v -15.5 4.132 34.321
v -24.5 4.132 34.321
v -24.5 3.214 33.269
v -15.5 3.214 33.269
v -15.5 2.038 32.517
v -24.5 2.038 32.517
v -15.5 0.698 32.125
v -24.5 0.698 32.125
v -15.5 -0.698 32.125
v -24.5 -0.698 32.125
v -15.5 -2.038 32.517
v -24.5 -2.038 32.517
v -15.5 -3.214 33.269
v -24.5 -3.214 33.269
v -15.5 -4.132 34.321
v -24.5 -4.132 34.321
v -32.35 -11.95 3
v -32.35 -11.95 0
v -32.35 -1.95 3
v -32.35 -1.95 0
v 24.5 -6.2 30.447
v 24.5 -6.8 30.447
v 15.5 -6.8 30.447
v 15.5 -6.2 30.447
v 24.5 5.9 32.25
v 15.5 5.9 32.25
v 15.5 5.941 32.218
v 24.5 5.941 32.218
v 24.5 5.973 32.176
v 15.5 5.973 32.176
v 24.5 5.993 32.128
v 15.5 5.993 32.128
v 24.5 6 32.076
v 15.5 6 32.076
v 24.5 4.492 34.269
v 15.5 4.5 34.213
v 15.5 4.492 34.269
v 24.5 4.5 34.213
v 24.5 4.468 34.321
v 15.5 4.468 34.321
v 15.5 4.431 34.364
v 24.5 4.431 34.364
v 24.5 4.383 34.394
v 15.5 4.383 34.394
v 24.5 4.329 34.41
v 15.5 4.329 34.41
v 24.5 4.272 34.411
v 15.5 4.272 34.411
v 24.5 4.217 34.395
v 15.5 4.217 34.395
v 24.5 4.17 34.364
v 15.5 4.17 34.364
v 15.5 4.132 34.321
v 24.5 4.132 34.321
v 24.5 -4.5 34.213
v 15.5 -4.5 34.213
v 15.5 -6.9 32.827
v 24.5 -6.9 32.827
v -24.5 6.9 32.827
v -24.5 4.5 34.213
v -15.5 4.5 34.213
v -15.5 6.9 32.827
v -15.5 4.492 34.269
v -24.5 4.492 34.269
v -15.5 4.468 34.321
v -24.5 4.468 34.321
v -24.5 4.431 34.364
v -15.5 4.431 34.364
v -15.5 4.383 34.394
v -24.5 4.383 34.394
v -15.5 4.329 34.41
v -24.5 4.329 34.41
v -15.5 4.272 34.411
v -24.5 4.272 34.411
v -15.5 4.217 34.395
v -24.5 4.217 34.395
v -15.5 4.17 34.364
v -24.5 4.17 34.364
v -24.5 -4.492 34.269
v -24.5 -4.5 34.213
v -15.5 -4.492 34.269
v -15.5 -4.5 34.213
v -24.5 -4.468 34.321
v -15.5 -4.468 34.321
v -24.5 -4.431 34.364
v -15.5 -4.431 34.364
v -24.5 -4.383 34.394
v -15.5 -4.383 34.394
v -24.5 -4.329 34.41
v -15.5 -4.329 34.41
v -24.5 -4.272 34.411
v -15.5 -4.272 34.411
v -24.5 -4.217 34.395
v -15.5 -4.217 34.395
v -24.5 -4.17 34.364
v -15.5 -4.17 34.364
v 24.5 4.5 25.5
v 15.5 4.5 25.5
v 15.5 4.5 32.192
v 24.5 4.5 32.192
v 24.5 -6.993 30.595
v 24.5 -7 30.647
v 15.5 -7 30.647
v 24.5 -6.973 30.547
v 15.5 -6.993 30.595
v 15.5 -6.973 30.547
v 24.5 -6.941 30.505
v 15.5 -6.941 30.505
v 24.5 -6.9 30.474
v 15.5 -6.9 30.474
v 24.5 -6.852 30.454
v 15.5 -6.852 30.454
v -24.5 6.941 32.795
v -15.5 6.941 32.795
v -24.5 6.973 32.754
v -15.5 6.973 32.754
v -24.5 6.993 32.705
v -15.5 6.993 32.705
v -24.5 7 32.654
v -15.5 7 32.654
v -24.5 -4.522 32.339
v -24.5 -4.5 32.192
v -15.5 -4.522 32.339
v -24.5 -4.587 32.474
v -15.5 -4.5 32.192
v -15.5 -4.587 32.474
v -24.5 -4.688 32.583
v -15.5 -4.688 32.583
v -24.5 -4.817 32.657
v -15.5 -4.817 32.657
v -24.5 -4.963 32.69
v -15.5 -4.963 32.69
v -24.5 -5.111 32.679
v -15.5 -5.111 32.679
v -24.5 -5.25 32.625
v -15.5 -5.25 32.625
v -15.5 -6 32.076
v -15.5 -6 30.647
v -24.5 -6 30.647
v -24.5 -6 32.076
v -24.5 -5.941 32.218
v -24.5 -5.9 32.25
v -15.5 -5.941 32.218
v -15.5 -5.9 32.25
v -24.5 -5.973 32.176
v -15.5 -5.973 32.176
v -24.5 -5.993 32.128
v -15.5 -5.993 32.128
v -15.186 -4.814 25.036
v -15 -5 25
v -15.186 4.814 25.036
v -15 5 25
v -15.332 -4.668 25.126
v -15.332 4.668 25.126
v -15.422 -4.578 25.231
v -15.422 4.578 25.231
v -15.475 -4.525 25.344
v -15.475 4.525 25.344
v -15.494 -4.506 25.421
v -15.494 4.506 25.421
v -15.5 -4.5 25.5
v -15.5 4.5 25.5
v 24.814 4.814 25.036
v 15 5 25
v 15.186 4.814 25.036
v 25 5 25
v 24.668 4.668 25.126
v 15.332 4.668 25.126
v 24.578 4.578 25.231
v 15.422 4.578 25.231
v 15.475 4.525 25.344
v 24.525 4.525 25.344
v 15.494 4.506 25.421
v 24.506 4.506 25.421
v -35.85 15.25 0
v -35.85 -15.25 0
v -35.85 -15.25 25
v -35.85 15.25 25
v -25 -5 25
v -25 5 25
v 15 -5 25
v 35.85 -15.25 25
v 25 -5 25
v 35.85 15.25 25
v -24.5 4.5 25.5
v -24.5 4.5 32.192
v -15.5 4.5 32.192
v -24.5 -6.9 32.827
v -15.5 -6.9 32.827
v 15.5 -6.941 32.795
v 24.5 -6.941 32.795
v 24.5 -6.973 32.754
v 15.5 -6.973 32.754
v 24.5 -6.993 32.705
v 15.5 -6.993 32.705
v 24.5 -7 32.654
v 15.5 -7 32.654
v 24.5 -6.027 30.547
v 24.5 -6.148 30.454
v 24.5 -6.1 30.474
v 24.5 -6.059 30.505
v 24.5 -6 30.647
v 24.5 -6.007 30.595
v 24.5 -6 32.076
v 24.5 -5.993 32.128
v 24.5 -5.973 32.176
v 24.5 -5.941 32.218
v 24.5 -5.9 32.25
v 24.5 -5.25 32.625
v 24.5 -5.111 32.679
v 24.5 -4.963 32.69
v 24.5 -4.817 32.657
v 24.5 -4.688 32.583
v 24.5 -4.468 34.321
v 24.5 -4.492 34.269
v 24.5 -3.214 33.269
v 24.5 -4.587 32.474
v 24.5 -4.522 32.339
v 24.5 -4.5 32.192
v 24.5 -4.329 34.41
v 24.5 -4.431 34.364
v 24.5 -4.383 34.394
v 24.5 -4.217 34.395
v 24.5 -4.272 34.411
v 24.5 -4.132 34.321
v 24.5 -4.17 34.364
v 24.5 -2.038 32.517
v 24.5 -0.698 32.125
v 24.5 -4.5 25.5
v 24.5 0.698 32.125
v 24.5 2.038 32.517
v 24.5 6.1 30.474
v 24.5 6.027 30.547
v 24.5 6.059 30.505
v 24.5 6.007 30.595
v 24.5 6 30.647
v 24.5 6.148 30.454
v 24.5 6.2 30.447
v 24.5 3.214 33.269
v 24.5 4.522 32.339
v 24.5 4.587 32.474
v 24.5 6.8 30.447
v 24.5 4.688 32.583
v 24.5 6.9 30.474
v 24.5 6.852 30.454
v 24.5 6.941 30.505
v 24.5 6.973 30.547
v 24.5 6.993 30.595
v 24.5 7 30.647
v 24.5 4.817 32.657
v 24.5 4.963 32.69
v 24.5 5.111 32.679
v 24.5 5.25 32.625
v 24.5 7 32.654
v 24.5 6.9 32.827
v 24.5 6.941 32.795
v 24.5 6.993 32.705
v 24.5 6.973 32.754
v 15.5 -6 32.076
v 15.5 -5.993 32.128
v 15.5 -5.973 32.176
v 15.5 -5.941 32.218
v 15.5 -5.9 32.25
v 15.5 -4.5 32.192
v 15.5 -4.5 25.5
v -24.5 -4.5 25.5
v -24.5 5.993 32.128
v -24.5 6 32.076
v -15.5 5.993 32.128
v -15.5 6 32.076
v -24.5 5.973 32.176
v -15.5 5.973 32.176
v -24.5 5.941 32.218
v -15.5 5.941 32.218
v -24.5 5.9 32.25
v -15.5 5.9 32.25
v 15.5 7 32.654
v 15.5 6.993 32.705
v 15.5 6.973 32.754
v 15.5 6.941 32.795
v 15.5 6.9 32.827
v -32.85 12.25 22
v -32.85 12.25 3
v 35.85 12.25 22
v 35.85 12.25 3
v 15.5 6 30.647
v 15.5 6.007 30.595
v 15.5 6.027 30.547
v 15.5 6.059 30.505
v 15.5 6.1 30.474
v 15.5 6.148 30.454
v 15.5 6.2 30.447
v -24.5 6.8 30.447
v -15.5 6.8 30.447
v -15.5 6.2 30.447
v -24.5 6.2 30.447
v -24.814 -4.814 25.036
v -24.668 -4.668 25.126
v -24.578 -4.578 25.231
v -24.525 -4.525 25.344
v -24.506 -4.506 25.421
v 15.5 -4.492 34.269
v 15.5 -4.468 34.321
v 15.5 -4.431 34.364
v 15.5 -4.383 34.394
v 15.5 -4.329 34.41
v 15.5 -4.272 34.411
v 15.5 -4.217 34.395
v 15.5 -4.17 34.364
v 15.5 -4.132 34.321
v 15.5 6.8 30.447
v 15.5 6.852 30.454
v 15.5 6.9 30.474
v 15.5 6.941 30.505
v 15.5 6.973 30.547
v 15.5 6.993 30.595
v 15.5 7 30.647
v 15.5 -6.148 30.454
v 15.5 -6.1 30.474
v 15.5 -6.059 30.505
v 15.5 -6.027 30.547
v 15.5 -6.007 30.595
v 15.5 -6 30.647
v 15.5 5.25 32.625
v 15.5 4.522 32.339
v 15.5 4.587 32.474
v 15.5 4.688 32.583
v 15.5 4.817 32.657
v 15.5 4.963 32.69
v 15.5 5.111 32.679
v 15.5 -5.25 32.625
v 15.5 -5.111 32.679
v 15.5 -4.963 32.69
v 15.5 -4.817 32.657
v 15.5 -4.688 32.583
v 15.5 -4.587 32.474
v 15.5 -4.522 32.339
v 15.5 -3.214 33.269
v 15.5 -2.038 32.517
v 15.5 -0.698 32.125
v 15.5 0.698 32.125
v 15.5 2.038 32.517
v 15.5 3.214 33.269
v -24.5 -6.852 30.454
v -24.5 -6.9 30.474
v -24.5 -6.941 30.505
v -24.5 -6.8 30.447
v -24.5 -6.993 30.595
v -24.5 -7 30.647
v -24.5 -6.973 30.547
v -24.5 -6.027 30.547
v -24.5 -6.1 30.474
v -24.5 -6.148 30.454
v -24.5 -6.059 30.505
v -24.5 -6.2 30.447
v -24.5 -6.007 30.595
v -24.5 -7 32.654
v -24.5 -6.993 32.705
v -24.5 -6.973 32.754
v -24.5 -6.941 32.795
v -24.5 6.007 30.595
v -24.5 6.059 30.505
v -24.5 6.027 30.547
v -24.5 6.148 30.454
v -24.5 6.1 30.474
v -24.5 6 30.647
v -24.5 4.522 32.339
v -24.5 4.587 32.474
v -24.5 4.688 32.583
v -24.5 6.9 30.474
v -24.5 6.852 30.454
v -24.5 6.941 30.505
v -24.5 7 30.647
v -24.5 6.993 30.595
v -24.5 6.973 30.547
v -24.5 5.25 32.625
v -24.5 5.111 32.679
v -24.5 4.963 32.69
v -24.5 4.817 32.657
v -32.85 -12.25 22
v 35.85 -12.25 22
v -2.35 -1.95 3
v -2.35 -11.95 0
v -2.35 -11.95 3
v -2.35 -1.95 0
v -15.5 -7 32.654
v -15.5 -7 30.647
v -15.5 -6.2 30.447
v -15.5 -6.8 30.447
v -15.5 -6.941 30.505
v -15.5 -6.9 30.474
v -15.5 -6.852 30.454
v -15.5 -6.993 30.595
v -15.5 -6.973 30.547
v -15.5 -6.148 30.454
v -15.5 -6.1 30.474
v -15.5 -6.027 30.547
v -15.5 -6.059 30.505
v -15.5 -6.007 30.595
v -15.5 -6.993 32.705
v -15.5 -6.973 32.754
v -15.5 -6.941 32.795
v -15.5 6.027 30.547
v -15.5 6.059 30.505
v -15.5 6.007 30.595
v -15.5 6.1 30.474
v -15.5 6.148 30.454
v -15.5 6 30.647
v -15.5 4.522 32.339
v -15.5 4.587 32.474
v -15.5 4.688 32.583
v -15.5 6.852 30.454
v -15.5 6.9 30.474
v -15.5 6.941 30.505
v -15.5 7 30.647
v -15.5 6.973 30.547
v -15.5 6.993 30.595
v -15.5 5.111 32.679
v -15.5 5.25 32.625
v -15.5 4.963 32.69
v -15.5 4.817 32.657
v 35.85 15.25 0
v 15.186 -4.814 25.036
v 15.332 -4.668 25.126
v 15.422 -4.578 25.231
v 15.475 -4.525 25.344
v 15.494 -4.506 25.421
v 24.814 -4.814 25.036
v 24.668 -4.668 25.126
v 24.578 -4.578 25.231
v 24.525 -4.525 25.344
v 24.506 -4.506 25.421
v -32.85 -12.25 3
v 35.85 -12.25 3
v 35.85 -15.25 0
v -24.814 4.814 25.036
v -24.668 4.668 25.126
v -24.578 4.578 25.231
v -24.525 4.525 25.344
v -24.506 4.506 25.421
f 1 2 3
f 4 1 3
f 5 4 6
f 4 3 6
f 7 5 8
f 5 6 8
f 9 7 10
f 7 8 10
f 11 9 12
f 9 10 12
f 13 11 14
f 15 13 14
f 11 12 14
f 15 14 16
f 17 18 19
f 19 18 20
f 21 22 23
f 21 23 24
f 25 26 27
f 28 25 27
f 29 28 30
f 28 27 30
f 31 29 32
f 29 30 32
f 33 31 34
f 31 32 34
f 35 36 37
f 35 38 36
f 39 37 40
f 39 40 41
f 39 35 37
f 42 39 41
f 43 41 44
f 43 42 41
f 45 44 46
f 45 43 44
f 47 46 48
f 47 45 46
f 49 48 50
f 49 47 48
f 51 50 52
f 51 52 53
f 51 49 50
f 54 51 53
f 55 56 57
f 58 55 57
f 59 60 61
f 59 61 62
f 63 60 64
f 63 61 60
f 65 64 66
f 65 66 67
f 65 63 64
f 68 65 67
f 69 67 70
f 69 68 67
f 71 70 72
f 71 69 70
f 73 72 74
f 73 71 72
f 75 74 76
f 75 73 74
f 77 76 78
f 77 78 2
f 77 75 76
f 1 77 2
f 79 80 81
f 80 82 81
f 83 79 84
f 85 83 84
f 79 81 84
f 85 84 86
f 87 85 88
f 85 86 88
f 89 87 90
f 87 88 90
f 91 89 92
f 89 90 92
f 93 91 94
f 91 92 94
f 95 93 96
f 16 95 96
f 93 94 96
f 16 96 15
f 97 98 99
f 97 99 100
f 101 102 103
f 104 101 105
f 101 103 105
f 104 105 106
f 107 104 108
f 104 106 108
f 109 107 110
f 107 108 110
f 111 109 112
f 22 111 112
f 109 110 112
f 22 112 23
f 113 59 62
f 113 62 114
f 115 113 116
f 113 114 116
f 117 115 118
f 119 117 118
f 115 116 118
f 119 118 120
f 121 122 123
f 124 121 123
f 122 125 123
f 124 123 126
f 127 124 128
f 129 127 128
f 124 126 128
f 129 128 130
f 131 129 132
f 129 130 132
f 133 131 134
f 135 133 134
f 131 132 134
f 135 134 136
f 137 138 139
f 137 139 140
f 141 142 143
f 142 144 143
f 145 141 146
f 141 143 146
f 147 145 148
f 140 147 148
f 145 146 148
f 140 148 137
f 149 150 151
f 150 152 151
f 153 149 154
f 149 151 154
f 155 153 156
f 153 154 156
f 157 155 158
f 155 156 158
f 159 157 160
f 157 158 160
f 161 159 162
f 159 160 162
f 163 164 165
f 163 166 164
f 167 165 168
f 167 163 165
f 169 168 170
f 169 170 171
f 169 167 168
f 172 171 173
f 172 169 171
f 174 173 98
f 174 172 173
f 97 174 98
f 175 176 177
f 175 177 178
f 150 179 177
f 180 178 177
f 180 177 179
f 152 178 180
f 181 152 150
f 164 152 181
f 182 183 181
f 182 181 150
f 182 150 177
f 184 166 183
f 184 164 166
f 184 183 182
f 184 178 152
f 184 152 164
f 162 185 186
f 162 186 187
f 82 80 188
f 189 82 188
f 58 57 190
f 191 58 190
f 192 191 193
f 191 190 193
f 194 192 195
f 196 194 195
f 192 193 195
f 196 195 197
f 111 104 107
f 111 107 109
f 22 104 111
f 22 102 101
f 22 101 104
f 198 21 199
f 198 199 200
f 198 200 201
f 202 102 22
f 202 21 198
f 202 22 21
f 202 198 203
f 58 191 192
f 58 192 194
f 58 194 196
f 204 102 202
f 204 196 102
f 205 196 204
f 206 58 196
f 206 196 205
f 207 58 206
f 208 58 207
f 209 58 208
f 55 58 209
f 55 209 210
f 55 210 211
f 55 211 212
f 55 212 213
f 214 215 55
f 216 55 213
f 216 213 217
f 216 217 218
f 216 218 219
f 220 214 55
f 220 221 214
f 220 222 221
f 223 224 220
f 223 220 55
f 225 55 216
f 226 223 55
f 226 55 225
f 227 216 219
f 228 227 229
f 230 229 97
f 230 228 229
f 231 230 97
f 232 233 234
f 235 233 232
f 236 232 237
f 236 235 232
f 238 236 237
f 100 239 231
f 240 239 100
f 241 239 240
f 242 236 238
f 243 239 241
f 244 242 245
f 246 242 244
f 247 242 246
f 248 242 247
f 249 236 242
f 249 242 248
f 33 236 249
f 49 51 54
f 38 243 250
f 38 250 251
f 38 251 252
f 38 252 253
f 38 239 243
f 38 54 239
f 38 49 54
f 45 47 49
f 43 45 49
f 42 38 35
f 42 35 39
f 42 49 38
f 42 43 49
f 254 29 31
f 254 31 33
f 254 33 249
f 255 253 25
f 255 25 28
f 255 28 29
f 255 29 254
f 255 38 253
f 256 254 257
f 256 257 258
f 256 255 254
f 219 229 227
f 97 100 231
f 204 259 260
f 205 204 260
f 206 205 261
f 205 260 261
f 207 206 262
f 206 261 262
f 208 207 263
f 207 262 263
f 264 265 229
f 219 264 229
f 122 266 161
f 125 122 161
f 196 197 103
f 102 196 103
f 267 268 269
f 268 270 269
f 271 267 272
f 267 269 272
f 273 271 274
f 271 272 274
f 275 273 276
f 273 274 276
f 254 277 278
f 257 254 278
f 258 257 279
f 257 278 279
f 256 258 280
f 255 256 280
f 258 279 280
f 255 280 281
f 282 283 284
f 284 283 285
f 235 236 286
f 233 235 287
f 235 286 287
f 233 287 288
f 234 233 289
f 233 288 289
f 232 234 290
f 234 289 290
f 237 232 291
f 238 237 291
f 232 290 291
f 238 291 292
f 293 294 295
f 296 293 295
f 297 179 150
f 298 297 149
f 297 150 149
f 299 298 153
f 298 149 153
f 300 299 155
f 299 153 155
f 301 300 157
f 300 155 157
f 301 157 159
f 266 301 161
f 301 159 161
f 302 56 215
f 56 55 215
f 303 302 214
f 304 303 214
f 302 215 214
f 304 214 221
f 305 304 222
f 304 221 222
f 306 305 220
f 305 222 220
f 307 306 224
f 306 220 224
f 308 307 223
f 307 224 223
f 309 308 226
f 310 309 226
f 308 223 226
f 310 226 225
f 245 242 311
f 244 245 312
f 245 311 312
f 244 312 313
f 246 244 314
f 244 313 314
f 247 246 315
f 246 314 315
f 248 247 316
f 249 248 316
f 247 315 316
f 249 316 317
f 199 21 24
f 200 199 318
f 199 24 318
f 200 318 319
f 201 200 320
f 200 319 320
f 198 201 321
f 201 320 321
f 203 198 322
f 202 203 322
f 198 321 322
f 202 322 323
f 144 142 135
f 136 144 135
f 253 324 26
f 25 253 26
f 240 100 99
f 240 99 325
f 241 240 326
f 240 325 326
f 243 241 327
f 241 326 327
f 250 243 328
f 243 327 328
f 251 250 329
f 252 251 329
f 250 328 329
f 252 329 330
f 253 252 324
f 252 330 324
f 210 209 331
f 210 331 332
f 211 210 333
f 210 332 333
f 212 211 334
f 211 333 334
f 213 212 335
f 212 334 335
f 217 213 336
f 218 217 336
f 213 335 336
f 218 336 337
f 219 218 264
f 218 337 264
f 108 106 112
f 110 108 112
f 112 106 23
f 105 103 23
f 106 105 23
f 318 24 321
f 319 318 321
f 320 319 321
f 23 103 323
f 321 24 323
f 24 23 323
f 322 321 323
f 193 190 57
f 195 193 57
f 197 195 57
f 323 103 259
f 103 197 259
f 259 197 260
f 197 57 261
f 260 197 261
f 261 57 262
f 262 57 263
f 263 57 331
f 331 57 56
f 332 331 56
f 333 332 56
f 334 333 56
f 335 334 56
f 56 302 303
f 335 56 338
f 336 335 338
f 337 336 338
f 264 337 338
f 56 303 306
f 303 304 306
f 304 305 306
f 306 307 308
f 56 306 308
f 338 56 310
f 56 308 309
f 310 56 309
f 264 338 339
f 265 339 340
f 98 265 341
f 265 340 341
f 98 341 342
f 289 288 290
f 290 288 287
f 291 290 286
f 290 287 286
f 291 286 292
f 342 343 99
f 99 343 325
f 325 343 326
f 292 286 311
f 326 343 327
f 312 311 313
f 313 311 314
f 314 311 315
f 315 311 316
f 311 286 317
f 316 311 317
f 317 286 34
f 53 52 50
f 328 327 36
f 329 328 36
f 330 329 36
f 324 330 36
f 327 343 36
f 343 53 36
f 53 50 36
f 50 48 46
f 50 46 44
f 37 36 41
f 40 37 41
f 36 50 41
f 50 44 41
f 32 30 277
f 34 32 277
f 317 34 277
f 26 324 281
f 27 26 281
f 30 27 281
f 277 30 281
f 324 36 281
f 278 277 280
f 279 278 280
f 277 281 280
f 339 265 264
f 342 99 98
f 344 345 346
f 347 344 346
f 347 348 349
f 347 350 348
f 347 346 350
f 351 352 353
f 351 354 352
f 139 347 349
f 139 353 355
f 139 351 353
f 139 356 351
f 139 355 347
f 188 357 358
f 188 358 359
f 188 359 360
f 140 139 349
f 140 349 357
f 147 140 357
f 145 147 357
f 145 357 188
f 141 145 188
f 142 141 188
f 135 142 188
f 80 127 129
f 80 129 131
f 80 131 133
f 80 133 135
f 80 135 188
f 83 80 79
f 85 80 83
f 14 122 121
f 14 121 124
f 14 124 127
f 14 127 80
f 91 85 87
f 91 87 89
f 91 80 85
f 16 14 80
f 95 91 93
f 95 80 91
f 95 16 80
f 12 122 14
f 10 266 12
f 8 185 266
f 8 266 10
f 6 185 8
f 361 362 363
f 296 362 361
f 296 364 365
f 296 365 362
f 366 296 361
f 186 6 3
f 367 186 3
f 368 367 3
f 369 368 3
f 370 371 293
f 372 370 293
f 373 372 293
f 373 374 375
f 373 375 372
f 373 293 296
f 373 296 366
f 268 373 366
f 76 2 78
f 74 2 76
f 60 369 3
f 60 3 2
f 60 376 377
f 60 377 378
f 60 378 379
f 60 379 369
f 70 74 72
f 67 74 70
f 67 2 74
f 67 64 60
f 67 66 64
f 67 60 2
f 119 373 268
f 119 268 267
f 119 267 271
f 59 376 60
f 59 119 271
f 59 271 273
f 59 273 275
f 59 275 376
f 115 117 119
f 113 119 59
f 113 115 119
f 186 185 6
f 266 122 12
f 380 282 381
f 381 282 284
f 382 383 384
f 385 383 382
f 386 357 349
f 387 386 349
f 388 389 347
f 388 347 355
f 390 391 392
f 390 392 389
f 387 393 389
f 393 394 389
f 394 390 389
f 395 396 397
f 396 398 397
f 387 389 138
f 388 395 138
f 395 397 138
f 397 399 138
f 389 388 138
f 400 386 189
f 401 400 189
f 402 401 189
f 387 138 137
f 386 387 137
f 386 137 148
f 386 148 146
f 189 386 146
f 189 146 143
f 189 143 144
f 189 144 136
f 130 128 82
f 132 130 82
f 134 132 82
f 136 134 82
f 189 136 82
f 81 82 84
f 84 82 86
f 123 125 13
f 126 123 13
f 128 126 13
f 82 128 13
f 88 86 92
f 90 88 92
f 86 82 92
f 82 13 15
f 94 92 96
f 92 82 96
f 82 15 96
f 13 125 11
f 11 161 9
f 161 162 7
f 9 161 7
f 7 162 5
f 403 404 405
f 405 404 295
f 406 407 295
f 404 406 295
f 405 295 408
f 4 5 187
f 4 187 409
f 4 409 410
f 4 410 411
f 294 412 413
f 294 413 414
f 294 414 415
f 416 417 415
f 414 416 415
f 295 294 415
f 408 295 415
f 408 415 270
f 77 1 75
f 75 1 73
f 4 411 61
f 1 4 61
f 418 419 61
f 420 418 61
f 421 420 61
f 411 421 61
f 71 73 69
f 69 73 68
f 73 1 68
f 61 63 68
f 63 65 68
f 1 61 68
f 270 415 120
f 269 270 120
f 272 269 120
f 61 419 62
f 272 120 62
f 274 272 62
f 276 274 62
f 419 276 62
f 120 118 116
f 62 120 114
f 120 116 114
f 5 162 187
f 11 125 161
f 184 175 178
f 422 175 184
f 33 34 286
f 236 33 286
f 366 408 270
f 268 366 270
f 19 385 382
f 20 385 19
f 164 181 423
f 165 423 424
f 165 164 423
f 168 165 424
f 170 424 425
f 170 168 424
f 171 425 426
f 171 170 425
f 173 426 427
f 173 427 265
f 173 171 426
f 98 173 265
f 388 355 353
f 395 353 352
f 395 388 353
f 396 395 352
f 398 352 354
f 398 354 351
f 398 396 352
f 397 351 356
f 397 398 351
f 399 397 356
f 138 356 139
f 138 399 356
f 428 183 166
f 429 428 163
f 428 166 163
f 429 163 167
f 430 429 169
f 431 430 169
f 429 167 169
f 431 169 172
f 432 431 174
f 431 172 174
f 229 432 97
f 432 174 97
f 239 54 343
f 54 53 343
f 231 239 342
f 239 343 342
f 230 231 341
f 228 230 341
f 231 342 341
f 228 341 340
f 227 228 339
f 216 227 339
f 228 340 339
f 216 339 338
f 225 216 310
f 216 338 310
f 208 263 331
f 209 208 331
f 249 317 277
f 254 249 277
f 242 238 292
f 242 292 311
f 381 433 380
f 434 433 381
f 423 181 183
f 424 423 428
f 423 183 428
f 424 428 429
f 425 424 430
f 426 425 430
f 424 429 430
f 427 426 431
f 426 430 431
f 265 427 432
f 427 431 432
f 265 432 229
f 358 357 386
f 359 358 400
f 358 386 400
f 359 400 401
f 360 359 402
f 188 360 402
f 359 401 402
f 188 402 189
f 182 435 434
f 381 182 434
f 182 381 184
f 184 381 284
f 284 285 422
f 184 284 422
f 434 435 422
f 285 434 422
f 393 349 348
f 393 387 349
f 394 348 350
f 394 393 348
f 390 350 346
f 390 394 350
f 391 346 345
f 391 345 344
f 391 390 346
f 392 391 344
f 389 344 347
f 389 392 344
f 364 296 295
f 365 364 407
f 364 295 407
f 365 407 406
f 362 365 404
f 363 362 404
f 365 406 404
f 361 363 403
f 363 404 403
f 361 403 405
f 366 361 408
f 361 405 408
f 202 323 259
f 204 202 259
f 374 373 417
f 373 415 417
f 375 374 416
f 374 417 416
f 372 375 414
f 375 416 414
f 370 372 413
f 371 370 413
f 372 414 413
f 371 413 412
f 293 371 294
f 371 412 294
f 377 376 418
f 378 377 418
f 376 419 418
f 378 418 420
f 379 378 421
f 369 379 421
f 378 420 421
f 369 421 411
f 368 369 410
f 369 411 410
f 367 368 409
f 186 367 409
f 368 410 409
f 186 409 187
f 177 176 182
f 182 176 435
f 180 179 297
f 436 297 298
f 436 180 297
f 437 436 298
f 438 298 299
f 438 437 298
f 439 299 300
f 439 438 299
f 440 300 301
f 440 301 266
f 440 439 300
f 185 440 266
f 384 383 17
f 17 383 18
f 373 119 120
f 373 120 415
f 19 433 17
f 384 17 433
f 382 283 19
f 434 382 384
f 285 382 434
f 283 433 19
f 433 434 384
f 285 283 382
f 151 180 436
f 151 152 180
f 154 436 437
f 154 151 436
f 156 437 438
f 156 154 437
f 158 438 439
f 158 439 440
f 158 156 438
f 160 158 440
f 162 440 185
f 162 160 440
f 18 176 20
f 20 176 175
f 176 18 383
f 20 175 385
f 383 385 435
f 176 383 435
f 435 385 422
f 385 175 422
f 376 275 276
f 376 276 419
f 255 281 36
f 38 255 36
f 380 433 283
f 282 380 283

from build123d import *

# Parameters (mm, degrees)
SKETCH_1_W          = 71.7
SKETCH_1_H          = 30.5
EXTRUDE_1_DEPTH     = 25
SHELL_1_T           = -3
CUT_EXTRUDE_1_REACH = 48.29
SKETCH_2_W          = 30
SKETCH_2_H          = 10
SKETCH_3_W          = 9
SKETCH_3_H          = 9
EXTRUDE_2_DEPTH     = 10
SKETCH_4_R          = 4.924428901
CUT_EXTRUDE_2_DEPTH = 72.41207881
FILLET_1_R          = 0.2
EXTRUDE_3_DEPTH     = 9
FILLET_2_R          = 0.2
FILLET_3_R          = 0.5
MIRROR_START        = 15.5
MIRROR_2_DEPTH      = 9
FILLET_5_R          = 0.5
FILLET_6_R          = 0.5


# Read off the part's stored shape, not the designer's step: 镜向2
with BuildPart() as part:
    # 草图1 → 凸台-拉伸1 (new body)
    with BuildSketch(Plane.XY):
        Rectangle(SKETCH_1_W, SKETCH_1_H)
    extrude(amount=EXTRUDE_1_DEPTH)

    # 抽壳1
    shell_1_openings = [part.faces().sort_by_distance(p)[0] for p in [
        (35.85, 0, 12.5),
    ]]
    offset(amount=SHELL_1_T, openings=shell_1_openings, kind=Kind.INTERSECTION)

    # 草图2 → 切除-拉伸1 (cut, up to next)
    with BuildSketch(Plane(origin=(0, 0, 0), x_dir=(-1, 0, 0), z_dir=(0, 0, -1)), mode=Mode.PRIVATE) as cut_extrude_1_sk1:
        with Locations((17.35, -6.95)):
            Rectangle(SKETCH_2_W, SKETCH_2_H)
    cut_extrude_1_tool1 = extrude(cut_extrude_1_sk1.sketch, amount=-CUT_EXTRUDE_1_REACH, mode=Mode.PRIVATE) & part.part
    add(cut_extrude_1_tool1.solids().sort_by_distance((-17.35, -6.95, 0))[0], mode=Mode.SUBTRACT)

    # 草图3 → 凸台-拉伸2 (add)
    with BuildSketch(Plane.XY.offset(25)):
        with Locations((-20, 0)):
            Rectangle(SKETCH_3_W, SKETCH_3_H)
        with Locations((20, 0)):
            Rectangle(SKETCH_3_W, SKETCH_3_H)
    extrude(amount=EXTRUDE_2_DEPTH)

    # 草图4 → 切除-拉伸2 (cut, through all)
    with BuildSketch(Plane.ZY.offset(24.5)):
        with Locations((37, 0)):
            Circle(SKETCH_4_R)
    extrude(amount=-CUT_EXTRUDE_2_DEPTH, mode=Mode.SUBTRACT)

    # 圆角1
    fillet_1_edges = [part.edges().sort_by_distance(p)[0] for p in [
        (-20, 4.5, 35),
        (-20, -4.5, 35),
        (20, 4.5, 35),
        (20, -4.5, 35),
    ]]
    fillet(fillet_1_edges, radius=FILLET_1_R)

    # 草图5 → 凸台-拉伸3 (add)
    with BuildSketch(Plane.ZY.offset(24.5)):
        Polygon((34.212569003, 4.5), (32.769193331, 7), (30.446869021, 7), (30.446869021, 6), (32.191843061, 6), (33.057868465, 4.5), align=None)
        Polygon((32.769193331, -7), (30.446869021, -7), (30.446869021, -6), (32.191843061, -6), (33.057868465, -4.5), (34.212569003, -4.5), align=None)
    extrude(amount=-EXTRUDE_3_DEPTH)

    # 圆角2
    fillet_2_edges = [part.edges().sort_by_distance(p)[0] for p in [
        (-20, 6, 32.191843061),
        (-20, 6, 30.446869021),
        (-20, 7, 30.446869021),
        (-20, 7, 32.769193331),
        (-20, -7, 32.769193331),
        (-20, -7, 30.446869021),
        (-20, -6, 30.446869021),
        (-20, -6, 32.191843061),
    ]]
    fillet(fillet_2_edges, radius=FILLET_2_R)

    # 圆角3
    fillet_3_edges = [part.edges().sort_by_distance(p)[0] for p in [
        (-20, 4.5, 33.057868465),
        (-20, -4.5, 33.057868465),
    ]]
    fillet(fillet_3_edges, radius=FILLET_3_R)

    # 镜向2 outline → 镜向2 (add)
    with BuildSketch(Plane.YZ.offset(MIRROR_START)):
        with BuildLine():
            Line((5.25, 32.624855763), (5.9, 32.249578088))
            ThreePointArc((5.9, 32.249578088), (5.973205081, 32.176373007), (6, 32.076373007))
            Line((6, 32.076373007), (6, 30.646869021))
            ThreePointArc((6, 30.646869021), (6.058578644, 30.505447665), (6.2, 30.446869021))
            Line((6.2, 30.446869021), (6.8, 30.446869021))
            ThreePointArc((6.8, 30.446869021), (6.941421356, 30.505447665), (7, 30.646869021))
            Line((7, 30.646869021), (7, 32.653723277))
            ThreePointArc((7, 32.653723277), (6.973205081, 32.753723277), (6.9, 32.826928357))
            Line((6.9, 32.826928357), (4.5, 34.212569003))
            Line((4.5, 34.212569003), (4.5, 32.191843061))
            ThreePointArc((4.5, 32.191843061), (4.75, 32.624855763), (5.25, 32.624855763))
        make_face()
        with BuildLine():
            Line((-6.8, 30.446869021), (-6.2, 30.446869021))
            ThreePointArc((-6.2, 30.446869021), (-6.058578644, 30.505447665), (-6, 30.646869021))
            Line((-6, 30.646869021), (-6, 32.076373007))
            ThreePointArc((-6, 32.076373007), (-5.973205081, 32.176373007), (-5.9, 32.249578088))
            Line((-5.9, 32.249578088), (-5.25, 32.624855763))
            ThreePointArc((-5.25, 32.624855763), (-4.75, 32.624855763), (-4.5, 32.191843061))
            Line((-4.5, 32.191843061), (-4.5, 34.212569003))
            Line((-4.5, 34.212569003), (-6.9, 32.826928357))
            ThreePointArc((-6.9, 32.826928357), (-6.973205081, 32.753723277), (-7, 32.653723277))
            Line((-7, 32.653723277), (-7, 30.646869021))
            ThreePointArc((-7, 30.646869021), (-6.941421356, 30.505447665), (-6.8, 30.446869021))
        make_face()
    extrude(amount=MIRROR_2_DEPTH)

    # 圆角5
    fillet_5_edges = [part.edges().sort_by_distance(p)[0] for p in [
        (-15.5, 0, 25),
        (-20, 4.5, 25),
        (-24.5, 0, 25),
        (-20, -4.5, 25),
    ]]
    fillet(fillet_5_edges, radius=FILLET_5_R)

    # 圆角6
    fillet_6_edges = [part.edges().sort_by_distance(p)[0] for p in [
        (24.5, 0, 25),
        (20, 4.5, 25),
        (15.5, 0, 25),
        (20, -4.5, 25),
    ]]
    fillet(fillet_6_edges, radius=FILLET_6_R)


solid = part.part
